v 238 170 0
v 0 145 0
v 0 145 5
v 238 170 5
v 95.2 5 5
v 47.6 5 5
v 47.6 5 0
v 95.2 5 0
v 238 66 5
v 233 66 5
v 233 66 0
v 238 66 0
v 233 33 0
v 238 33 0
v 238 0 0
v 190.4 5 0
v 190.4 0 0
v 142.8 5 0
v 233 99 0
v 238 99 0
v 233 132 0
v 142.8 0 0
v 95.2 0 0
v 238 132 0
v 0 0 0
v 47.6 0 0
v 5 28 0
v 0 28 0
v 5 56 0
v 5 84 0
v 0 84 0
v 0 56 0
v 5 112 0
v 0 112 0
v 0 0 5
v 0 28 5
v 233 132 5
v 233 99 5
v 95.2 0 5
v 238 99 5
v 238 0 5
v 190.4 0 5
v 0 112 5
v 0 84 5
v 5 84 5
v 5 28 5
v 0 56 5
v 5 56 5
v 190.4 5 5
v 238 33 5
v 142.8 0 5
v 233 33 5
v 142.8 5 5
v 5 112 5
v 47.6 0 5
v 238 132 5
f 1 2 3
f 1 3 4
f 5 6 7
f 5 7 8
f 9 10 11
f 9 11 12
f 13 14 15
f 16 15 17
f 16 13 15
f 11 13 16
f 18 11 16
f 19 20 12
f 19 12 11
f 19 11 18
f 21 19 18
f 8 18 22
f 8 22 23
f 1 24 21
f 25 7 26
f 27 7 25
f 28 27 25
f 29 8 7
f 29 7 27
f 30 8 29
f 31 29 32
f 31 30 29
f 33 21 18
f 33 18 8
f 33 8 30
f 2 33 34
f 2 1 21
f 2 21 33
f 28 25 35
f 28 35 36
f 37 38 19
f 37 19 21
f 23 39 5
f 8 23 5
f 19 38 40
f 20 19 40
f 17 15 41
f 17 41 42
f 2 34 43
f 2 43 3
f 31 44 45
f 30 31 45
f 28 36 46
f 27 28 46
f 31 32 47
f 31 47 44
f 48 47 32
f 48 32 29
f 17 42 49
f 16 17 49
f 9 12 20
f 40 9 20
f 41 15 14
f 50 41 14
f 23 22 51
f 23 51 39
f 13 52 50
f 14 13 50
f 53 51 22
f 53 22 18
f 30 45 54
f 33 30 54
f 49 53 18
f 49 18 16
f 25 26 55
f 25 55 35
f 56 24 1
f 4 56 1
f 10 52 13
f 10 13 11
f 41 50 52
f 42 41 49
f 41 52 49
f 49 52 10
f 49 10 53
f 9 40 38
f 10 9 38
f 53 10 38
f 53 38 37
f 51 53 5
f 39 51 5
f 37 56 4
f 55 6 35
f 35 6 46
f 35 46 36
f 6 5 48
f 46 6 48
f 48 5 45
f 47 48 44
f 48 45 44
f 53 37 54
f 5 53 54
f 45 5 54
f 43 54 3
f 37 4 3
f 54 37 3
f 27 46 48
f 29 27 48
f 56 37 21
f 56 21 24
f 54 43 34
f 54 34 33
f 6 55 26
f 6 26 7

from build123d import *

# Parameters (mm, degrees)
BOSS_EXTRU_1_DEPTH      = 5
ESQUISSE2_W             = 5
ESQUISSE2_H             = 28
ESQUISSE2_W_2           = 47.6
ESQUISSE2_H_2           = 5
ESQUISSE2_H_3           = 33
ENL_V_MAT_EXTRU_1_DEPTH = 5


with BuildPart() as part:
    # Esquisse1 → Boss.-Extru.1 (new body)
    with BuildSketch(Plane.XY):
        Polygon((0, 0), (0, 145), (238, 170), (238, 5), (238, 0), align=None)
    extrude(amount=BOSS_EXTRU_1_DEPTH)

    # Esquisse2 → Enlèv. mat.-Extru.1 (cut)
    with BuildSketch(Plane.XY.offset(5)):
        with Locations((2.5, 42)):
            Rectangle(ESQUISSE2_W, ESQUISSE2_H)
        with Locations((2.5, 98)):
            Rectangle(ESQUISSE2_W, ESQUISSE2_H)
        with Locations((71.4, 2.5)):
            Rectangle(ESQUISSE2_W_2, ESQUISSE2_H_2)
        with Locations((166.6, 2.5)):
            Rectangle(ESQUISSE2_W_2, ESQUISSE2_H_2)
        with Locations((235.5, 115.5)):
            Rectangle(ESQUISSE2_W, ESQUISSE2_H_3)
        with Locations((235.5, 49.5)):
            Rectangle(ESQUISSE2_W, ESQUISSE2_H_3)
    extrude(amount=-ENL_V_MAT_EXTRU_1_DEPTH, mode=Mode.SUBTRACT)


solid = part.part
